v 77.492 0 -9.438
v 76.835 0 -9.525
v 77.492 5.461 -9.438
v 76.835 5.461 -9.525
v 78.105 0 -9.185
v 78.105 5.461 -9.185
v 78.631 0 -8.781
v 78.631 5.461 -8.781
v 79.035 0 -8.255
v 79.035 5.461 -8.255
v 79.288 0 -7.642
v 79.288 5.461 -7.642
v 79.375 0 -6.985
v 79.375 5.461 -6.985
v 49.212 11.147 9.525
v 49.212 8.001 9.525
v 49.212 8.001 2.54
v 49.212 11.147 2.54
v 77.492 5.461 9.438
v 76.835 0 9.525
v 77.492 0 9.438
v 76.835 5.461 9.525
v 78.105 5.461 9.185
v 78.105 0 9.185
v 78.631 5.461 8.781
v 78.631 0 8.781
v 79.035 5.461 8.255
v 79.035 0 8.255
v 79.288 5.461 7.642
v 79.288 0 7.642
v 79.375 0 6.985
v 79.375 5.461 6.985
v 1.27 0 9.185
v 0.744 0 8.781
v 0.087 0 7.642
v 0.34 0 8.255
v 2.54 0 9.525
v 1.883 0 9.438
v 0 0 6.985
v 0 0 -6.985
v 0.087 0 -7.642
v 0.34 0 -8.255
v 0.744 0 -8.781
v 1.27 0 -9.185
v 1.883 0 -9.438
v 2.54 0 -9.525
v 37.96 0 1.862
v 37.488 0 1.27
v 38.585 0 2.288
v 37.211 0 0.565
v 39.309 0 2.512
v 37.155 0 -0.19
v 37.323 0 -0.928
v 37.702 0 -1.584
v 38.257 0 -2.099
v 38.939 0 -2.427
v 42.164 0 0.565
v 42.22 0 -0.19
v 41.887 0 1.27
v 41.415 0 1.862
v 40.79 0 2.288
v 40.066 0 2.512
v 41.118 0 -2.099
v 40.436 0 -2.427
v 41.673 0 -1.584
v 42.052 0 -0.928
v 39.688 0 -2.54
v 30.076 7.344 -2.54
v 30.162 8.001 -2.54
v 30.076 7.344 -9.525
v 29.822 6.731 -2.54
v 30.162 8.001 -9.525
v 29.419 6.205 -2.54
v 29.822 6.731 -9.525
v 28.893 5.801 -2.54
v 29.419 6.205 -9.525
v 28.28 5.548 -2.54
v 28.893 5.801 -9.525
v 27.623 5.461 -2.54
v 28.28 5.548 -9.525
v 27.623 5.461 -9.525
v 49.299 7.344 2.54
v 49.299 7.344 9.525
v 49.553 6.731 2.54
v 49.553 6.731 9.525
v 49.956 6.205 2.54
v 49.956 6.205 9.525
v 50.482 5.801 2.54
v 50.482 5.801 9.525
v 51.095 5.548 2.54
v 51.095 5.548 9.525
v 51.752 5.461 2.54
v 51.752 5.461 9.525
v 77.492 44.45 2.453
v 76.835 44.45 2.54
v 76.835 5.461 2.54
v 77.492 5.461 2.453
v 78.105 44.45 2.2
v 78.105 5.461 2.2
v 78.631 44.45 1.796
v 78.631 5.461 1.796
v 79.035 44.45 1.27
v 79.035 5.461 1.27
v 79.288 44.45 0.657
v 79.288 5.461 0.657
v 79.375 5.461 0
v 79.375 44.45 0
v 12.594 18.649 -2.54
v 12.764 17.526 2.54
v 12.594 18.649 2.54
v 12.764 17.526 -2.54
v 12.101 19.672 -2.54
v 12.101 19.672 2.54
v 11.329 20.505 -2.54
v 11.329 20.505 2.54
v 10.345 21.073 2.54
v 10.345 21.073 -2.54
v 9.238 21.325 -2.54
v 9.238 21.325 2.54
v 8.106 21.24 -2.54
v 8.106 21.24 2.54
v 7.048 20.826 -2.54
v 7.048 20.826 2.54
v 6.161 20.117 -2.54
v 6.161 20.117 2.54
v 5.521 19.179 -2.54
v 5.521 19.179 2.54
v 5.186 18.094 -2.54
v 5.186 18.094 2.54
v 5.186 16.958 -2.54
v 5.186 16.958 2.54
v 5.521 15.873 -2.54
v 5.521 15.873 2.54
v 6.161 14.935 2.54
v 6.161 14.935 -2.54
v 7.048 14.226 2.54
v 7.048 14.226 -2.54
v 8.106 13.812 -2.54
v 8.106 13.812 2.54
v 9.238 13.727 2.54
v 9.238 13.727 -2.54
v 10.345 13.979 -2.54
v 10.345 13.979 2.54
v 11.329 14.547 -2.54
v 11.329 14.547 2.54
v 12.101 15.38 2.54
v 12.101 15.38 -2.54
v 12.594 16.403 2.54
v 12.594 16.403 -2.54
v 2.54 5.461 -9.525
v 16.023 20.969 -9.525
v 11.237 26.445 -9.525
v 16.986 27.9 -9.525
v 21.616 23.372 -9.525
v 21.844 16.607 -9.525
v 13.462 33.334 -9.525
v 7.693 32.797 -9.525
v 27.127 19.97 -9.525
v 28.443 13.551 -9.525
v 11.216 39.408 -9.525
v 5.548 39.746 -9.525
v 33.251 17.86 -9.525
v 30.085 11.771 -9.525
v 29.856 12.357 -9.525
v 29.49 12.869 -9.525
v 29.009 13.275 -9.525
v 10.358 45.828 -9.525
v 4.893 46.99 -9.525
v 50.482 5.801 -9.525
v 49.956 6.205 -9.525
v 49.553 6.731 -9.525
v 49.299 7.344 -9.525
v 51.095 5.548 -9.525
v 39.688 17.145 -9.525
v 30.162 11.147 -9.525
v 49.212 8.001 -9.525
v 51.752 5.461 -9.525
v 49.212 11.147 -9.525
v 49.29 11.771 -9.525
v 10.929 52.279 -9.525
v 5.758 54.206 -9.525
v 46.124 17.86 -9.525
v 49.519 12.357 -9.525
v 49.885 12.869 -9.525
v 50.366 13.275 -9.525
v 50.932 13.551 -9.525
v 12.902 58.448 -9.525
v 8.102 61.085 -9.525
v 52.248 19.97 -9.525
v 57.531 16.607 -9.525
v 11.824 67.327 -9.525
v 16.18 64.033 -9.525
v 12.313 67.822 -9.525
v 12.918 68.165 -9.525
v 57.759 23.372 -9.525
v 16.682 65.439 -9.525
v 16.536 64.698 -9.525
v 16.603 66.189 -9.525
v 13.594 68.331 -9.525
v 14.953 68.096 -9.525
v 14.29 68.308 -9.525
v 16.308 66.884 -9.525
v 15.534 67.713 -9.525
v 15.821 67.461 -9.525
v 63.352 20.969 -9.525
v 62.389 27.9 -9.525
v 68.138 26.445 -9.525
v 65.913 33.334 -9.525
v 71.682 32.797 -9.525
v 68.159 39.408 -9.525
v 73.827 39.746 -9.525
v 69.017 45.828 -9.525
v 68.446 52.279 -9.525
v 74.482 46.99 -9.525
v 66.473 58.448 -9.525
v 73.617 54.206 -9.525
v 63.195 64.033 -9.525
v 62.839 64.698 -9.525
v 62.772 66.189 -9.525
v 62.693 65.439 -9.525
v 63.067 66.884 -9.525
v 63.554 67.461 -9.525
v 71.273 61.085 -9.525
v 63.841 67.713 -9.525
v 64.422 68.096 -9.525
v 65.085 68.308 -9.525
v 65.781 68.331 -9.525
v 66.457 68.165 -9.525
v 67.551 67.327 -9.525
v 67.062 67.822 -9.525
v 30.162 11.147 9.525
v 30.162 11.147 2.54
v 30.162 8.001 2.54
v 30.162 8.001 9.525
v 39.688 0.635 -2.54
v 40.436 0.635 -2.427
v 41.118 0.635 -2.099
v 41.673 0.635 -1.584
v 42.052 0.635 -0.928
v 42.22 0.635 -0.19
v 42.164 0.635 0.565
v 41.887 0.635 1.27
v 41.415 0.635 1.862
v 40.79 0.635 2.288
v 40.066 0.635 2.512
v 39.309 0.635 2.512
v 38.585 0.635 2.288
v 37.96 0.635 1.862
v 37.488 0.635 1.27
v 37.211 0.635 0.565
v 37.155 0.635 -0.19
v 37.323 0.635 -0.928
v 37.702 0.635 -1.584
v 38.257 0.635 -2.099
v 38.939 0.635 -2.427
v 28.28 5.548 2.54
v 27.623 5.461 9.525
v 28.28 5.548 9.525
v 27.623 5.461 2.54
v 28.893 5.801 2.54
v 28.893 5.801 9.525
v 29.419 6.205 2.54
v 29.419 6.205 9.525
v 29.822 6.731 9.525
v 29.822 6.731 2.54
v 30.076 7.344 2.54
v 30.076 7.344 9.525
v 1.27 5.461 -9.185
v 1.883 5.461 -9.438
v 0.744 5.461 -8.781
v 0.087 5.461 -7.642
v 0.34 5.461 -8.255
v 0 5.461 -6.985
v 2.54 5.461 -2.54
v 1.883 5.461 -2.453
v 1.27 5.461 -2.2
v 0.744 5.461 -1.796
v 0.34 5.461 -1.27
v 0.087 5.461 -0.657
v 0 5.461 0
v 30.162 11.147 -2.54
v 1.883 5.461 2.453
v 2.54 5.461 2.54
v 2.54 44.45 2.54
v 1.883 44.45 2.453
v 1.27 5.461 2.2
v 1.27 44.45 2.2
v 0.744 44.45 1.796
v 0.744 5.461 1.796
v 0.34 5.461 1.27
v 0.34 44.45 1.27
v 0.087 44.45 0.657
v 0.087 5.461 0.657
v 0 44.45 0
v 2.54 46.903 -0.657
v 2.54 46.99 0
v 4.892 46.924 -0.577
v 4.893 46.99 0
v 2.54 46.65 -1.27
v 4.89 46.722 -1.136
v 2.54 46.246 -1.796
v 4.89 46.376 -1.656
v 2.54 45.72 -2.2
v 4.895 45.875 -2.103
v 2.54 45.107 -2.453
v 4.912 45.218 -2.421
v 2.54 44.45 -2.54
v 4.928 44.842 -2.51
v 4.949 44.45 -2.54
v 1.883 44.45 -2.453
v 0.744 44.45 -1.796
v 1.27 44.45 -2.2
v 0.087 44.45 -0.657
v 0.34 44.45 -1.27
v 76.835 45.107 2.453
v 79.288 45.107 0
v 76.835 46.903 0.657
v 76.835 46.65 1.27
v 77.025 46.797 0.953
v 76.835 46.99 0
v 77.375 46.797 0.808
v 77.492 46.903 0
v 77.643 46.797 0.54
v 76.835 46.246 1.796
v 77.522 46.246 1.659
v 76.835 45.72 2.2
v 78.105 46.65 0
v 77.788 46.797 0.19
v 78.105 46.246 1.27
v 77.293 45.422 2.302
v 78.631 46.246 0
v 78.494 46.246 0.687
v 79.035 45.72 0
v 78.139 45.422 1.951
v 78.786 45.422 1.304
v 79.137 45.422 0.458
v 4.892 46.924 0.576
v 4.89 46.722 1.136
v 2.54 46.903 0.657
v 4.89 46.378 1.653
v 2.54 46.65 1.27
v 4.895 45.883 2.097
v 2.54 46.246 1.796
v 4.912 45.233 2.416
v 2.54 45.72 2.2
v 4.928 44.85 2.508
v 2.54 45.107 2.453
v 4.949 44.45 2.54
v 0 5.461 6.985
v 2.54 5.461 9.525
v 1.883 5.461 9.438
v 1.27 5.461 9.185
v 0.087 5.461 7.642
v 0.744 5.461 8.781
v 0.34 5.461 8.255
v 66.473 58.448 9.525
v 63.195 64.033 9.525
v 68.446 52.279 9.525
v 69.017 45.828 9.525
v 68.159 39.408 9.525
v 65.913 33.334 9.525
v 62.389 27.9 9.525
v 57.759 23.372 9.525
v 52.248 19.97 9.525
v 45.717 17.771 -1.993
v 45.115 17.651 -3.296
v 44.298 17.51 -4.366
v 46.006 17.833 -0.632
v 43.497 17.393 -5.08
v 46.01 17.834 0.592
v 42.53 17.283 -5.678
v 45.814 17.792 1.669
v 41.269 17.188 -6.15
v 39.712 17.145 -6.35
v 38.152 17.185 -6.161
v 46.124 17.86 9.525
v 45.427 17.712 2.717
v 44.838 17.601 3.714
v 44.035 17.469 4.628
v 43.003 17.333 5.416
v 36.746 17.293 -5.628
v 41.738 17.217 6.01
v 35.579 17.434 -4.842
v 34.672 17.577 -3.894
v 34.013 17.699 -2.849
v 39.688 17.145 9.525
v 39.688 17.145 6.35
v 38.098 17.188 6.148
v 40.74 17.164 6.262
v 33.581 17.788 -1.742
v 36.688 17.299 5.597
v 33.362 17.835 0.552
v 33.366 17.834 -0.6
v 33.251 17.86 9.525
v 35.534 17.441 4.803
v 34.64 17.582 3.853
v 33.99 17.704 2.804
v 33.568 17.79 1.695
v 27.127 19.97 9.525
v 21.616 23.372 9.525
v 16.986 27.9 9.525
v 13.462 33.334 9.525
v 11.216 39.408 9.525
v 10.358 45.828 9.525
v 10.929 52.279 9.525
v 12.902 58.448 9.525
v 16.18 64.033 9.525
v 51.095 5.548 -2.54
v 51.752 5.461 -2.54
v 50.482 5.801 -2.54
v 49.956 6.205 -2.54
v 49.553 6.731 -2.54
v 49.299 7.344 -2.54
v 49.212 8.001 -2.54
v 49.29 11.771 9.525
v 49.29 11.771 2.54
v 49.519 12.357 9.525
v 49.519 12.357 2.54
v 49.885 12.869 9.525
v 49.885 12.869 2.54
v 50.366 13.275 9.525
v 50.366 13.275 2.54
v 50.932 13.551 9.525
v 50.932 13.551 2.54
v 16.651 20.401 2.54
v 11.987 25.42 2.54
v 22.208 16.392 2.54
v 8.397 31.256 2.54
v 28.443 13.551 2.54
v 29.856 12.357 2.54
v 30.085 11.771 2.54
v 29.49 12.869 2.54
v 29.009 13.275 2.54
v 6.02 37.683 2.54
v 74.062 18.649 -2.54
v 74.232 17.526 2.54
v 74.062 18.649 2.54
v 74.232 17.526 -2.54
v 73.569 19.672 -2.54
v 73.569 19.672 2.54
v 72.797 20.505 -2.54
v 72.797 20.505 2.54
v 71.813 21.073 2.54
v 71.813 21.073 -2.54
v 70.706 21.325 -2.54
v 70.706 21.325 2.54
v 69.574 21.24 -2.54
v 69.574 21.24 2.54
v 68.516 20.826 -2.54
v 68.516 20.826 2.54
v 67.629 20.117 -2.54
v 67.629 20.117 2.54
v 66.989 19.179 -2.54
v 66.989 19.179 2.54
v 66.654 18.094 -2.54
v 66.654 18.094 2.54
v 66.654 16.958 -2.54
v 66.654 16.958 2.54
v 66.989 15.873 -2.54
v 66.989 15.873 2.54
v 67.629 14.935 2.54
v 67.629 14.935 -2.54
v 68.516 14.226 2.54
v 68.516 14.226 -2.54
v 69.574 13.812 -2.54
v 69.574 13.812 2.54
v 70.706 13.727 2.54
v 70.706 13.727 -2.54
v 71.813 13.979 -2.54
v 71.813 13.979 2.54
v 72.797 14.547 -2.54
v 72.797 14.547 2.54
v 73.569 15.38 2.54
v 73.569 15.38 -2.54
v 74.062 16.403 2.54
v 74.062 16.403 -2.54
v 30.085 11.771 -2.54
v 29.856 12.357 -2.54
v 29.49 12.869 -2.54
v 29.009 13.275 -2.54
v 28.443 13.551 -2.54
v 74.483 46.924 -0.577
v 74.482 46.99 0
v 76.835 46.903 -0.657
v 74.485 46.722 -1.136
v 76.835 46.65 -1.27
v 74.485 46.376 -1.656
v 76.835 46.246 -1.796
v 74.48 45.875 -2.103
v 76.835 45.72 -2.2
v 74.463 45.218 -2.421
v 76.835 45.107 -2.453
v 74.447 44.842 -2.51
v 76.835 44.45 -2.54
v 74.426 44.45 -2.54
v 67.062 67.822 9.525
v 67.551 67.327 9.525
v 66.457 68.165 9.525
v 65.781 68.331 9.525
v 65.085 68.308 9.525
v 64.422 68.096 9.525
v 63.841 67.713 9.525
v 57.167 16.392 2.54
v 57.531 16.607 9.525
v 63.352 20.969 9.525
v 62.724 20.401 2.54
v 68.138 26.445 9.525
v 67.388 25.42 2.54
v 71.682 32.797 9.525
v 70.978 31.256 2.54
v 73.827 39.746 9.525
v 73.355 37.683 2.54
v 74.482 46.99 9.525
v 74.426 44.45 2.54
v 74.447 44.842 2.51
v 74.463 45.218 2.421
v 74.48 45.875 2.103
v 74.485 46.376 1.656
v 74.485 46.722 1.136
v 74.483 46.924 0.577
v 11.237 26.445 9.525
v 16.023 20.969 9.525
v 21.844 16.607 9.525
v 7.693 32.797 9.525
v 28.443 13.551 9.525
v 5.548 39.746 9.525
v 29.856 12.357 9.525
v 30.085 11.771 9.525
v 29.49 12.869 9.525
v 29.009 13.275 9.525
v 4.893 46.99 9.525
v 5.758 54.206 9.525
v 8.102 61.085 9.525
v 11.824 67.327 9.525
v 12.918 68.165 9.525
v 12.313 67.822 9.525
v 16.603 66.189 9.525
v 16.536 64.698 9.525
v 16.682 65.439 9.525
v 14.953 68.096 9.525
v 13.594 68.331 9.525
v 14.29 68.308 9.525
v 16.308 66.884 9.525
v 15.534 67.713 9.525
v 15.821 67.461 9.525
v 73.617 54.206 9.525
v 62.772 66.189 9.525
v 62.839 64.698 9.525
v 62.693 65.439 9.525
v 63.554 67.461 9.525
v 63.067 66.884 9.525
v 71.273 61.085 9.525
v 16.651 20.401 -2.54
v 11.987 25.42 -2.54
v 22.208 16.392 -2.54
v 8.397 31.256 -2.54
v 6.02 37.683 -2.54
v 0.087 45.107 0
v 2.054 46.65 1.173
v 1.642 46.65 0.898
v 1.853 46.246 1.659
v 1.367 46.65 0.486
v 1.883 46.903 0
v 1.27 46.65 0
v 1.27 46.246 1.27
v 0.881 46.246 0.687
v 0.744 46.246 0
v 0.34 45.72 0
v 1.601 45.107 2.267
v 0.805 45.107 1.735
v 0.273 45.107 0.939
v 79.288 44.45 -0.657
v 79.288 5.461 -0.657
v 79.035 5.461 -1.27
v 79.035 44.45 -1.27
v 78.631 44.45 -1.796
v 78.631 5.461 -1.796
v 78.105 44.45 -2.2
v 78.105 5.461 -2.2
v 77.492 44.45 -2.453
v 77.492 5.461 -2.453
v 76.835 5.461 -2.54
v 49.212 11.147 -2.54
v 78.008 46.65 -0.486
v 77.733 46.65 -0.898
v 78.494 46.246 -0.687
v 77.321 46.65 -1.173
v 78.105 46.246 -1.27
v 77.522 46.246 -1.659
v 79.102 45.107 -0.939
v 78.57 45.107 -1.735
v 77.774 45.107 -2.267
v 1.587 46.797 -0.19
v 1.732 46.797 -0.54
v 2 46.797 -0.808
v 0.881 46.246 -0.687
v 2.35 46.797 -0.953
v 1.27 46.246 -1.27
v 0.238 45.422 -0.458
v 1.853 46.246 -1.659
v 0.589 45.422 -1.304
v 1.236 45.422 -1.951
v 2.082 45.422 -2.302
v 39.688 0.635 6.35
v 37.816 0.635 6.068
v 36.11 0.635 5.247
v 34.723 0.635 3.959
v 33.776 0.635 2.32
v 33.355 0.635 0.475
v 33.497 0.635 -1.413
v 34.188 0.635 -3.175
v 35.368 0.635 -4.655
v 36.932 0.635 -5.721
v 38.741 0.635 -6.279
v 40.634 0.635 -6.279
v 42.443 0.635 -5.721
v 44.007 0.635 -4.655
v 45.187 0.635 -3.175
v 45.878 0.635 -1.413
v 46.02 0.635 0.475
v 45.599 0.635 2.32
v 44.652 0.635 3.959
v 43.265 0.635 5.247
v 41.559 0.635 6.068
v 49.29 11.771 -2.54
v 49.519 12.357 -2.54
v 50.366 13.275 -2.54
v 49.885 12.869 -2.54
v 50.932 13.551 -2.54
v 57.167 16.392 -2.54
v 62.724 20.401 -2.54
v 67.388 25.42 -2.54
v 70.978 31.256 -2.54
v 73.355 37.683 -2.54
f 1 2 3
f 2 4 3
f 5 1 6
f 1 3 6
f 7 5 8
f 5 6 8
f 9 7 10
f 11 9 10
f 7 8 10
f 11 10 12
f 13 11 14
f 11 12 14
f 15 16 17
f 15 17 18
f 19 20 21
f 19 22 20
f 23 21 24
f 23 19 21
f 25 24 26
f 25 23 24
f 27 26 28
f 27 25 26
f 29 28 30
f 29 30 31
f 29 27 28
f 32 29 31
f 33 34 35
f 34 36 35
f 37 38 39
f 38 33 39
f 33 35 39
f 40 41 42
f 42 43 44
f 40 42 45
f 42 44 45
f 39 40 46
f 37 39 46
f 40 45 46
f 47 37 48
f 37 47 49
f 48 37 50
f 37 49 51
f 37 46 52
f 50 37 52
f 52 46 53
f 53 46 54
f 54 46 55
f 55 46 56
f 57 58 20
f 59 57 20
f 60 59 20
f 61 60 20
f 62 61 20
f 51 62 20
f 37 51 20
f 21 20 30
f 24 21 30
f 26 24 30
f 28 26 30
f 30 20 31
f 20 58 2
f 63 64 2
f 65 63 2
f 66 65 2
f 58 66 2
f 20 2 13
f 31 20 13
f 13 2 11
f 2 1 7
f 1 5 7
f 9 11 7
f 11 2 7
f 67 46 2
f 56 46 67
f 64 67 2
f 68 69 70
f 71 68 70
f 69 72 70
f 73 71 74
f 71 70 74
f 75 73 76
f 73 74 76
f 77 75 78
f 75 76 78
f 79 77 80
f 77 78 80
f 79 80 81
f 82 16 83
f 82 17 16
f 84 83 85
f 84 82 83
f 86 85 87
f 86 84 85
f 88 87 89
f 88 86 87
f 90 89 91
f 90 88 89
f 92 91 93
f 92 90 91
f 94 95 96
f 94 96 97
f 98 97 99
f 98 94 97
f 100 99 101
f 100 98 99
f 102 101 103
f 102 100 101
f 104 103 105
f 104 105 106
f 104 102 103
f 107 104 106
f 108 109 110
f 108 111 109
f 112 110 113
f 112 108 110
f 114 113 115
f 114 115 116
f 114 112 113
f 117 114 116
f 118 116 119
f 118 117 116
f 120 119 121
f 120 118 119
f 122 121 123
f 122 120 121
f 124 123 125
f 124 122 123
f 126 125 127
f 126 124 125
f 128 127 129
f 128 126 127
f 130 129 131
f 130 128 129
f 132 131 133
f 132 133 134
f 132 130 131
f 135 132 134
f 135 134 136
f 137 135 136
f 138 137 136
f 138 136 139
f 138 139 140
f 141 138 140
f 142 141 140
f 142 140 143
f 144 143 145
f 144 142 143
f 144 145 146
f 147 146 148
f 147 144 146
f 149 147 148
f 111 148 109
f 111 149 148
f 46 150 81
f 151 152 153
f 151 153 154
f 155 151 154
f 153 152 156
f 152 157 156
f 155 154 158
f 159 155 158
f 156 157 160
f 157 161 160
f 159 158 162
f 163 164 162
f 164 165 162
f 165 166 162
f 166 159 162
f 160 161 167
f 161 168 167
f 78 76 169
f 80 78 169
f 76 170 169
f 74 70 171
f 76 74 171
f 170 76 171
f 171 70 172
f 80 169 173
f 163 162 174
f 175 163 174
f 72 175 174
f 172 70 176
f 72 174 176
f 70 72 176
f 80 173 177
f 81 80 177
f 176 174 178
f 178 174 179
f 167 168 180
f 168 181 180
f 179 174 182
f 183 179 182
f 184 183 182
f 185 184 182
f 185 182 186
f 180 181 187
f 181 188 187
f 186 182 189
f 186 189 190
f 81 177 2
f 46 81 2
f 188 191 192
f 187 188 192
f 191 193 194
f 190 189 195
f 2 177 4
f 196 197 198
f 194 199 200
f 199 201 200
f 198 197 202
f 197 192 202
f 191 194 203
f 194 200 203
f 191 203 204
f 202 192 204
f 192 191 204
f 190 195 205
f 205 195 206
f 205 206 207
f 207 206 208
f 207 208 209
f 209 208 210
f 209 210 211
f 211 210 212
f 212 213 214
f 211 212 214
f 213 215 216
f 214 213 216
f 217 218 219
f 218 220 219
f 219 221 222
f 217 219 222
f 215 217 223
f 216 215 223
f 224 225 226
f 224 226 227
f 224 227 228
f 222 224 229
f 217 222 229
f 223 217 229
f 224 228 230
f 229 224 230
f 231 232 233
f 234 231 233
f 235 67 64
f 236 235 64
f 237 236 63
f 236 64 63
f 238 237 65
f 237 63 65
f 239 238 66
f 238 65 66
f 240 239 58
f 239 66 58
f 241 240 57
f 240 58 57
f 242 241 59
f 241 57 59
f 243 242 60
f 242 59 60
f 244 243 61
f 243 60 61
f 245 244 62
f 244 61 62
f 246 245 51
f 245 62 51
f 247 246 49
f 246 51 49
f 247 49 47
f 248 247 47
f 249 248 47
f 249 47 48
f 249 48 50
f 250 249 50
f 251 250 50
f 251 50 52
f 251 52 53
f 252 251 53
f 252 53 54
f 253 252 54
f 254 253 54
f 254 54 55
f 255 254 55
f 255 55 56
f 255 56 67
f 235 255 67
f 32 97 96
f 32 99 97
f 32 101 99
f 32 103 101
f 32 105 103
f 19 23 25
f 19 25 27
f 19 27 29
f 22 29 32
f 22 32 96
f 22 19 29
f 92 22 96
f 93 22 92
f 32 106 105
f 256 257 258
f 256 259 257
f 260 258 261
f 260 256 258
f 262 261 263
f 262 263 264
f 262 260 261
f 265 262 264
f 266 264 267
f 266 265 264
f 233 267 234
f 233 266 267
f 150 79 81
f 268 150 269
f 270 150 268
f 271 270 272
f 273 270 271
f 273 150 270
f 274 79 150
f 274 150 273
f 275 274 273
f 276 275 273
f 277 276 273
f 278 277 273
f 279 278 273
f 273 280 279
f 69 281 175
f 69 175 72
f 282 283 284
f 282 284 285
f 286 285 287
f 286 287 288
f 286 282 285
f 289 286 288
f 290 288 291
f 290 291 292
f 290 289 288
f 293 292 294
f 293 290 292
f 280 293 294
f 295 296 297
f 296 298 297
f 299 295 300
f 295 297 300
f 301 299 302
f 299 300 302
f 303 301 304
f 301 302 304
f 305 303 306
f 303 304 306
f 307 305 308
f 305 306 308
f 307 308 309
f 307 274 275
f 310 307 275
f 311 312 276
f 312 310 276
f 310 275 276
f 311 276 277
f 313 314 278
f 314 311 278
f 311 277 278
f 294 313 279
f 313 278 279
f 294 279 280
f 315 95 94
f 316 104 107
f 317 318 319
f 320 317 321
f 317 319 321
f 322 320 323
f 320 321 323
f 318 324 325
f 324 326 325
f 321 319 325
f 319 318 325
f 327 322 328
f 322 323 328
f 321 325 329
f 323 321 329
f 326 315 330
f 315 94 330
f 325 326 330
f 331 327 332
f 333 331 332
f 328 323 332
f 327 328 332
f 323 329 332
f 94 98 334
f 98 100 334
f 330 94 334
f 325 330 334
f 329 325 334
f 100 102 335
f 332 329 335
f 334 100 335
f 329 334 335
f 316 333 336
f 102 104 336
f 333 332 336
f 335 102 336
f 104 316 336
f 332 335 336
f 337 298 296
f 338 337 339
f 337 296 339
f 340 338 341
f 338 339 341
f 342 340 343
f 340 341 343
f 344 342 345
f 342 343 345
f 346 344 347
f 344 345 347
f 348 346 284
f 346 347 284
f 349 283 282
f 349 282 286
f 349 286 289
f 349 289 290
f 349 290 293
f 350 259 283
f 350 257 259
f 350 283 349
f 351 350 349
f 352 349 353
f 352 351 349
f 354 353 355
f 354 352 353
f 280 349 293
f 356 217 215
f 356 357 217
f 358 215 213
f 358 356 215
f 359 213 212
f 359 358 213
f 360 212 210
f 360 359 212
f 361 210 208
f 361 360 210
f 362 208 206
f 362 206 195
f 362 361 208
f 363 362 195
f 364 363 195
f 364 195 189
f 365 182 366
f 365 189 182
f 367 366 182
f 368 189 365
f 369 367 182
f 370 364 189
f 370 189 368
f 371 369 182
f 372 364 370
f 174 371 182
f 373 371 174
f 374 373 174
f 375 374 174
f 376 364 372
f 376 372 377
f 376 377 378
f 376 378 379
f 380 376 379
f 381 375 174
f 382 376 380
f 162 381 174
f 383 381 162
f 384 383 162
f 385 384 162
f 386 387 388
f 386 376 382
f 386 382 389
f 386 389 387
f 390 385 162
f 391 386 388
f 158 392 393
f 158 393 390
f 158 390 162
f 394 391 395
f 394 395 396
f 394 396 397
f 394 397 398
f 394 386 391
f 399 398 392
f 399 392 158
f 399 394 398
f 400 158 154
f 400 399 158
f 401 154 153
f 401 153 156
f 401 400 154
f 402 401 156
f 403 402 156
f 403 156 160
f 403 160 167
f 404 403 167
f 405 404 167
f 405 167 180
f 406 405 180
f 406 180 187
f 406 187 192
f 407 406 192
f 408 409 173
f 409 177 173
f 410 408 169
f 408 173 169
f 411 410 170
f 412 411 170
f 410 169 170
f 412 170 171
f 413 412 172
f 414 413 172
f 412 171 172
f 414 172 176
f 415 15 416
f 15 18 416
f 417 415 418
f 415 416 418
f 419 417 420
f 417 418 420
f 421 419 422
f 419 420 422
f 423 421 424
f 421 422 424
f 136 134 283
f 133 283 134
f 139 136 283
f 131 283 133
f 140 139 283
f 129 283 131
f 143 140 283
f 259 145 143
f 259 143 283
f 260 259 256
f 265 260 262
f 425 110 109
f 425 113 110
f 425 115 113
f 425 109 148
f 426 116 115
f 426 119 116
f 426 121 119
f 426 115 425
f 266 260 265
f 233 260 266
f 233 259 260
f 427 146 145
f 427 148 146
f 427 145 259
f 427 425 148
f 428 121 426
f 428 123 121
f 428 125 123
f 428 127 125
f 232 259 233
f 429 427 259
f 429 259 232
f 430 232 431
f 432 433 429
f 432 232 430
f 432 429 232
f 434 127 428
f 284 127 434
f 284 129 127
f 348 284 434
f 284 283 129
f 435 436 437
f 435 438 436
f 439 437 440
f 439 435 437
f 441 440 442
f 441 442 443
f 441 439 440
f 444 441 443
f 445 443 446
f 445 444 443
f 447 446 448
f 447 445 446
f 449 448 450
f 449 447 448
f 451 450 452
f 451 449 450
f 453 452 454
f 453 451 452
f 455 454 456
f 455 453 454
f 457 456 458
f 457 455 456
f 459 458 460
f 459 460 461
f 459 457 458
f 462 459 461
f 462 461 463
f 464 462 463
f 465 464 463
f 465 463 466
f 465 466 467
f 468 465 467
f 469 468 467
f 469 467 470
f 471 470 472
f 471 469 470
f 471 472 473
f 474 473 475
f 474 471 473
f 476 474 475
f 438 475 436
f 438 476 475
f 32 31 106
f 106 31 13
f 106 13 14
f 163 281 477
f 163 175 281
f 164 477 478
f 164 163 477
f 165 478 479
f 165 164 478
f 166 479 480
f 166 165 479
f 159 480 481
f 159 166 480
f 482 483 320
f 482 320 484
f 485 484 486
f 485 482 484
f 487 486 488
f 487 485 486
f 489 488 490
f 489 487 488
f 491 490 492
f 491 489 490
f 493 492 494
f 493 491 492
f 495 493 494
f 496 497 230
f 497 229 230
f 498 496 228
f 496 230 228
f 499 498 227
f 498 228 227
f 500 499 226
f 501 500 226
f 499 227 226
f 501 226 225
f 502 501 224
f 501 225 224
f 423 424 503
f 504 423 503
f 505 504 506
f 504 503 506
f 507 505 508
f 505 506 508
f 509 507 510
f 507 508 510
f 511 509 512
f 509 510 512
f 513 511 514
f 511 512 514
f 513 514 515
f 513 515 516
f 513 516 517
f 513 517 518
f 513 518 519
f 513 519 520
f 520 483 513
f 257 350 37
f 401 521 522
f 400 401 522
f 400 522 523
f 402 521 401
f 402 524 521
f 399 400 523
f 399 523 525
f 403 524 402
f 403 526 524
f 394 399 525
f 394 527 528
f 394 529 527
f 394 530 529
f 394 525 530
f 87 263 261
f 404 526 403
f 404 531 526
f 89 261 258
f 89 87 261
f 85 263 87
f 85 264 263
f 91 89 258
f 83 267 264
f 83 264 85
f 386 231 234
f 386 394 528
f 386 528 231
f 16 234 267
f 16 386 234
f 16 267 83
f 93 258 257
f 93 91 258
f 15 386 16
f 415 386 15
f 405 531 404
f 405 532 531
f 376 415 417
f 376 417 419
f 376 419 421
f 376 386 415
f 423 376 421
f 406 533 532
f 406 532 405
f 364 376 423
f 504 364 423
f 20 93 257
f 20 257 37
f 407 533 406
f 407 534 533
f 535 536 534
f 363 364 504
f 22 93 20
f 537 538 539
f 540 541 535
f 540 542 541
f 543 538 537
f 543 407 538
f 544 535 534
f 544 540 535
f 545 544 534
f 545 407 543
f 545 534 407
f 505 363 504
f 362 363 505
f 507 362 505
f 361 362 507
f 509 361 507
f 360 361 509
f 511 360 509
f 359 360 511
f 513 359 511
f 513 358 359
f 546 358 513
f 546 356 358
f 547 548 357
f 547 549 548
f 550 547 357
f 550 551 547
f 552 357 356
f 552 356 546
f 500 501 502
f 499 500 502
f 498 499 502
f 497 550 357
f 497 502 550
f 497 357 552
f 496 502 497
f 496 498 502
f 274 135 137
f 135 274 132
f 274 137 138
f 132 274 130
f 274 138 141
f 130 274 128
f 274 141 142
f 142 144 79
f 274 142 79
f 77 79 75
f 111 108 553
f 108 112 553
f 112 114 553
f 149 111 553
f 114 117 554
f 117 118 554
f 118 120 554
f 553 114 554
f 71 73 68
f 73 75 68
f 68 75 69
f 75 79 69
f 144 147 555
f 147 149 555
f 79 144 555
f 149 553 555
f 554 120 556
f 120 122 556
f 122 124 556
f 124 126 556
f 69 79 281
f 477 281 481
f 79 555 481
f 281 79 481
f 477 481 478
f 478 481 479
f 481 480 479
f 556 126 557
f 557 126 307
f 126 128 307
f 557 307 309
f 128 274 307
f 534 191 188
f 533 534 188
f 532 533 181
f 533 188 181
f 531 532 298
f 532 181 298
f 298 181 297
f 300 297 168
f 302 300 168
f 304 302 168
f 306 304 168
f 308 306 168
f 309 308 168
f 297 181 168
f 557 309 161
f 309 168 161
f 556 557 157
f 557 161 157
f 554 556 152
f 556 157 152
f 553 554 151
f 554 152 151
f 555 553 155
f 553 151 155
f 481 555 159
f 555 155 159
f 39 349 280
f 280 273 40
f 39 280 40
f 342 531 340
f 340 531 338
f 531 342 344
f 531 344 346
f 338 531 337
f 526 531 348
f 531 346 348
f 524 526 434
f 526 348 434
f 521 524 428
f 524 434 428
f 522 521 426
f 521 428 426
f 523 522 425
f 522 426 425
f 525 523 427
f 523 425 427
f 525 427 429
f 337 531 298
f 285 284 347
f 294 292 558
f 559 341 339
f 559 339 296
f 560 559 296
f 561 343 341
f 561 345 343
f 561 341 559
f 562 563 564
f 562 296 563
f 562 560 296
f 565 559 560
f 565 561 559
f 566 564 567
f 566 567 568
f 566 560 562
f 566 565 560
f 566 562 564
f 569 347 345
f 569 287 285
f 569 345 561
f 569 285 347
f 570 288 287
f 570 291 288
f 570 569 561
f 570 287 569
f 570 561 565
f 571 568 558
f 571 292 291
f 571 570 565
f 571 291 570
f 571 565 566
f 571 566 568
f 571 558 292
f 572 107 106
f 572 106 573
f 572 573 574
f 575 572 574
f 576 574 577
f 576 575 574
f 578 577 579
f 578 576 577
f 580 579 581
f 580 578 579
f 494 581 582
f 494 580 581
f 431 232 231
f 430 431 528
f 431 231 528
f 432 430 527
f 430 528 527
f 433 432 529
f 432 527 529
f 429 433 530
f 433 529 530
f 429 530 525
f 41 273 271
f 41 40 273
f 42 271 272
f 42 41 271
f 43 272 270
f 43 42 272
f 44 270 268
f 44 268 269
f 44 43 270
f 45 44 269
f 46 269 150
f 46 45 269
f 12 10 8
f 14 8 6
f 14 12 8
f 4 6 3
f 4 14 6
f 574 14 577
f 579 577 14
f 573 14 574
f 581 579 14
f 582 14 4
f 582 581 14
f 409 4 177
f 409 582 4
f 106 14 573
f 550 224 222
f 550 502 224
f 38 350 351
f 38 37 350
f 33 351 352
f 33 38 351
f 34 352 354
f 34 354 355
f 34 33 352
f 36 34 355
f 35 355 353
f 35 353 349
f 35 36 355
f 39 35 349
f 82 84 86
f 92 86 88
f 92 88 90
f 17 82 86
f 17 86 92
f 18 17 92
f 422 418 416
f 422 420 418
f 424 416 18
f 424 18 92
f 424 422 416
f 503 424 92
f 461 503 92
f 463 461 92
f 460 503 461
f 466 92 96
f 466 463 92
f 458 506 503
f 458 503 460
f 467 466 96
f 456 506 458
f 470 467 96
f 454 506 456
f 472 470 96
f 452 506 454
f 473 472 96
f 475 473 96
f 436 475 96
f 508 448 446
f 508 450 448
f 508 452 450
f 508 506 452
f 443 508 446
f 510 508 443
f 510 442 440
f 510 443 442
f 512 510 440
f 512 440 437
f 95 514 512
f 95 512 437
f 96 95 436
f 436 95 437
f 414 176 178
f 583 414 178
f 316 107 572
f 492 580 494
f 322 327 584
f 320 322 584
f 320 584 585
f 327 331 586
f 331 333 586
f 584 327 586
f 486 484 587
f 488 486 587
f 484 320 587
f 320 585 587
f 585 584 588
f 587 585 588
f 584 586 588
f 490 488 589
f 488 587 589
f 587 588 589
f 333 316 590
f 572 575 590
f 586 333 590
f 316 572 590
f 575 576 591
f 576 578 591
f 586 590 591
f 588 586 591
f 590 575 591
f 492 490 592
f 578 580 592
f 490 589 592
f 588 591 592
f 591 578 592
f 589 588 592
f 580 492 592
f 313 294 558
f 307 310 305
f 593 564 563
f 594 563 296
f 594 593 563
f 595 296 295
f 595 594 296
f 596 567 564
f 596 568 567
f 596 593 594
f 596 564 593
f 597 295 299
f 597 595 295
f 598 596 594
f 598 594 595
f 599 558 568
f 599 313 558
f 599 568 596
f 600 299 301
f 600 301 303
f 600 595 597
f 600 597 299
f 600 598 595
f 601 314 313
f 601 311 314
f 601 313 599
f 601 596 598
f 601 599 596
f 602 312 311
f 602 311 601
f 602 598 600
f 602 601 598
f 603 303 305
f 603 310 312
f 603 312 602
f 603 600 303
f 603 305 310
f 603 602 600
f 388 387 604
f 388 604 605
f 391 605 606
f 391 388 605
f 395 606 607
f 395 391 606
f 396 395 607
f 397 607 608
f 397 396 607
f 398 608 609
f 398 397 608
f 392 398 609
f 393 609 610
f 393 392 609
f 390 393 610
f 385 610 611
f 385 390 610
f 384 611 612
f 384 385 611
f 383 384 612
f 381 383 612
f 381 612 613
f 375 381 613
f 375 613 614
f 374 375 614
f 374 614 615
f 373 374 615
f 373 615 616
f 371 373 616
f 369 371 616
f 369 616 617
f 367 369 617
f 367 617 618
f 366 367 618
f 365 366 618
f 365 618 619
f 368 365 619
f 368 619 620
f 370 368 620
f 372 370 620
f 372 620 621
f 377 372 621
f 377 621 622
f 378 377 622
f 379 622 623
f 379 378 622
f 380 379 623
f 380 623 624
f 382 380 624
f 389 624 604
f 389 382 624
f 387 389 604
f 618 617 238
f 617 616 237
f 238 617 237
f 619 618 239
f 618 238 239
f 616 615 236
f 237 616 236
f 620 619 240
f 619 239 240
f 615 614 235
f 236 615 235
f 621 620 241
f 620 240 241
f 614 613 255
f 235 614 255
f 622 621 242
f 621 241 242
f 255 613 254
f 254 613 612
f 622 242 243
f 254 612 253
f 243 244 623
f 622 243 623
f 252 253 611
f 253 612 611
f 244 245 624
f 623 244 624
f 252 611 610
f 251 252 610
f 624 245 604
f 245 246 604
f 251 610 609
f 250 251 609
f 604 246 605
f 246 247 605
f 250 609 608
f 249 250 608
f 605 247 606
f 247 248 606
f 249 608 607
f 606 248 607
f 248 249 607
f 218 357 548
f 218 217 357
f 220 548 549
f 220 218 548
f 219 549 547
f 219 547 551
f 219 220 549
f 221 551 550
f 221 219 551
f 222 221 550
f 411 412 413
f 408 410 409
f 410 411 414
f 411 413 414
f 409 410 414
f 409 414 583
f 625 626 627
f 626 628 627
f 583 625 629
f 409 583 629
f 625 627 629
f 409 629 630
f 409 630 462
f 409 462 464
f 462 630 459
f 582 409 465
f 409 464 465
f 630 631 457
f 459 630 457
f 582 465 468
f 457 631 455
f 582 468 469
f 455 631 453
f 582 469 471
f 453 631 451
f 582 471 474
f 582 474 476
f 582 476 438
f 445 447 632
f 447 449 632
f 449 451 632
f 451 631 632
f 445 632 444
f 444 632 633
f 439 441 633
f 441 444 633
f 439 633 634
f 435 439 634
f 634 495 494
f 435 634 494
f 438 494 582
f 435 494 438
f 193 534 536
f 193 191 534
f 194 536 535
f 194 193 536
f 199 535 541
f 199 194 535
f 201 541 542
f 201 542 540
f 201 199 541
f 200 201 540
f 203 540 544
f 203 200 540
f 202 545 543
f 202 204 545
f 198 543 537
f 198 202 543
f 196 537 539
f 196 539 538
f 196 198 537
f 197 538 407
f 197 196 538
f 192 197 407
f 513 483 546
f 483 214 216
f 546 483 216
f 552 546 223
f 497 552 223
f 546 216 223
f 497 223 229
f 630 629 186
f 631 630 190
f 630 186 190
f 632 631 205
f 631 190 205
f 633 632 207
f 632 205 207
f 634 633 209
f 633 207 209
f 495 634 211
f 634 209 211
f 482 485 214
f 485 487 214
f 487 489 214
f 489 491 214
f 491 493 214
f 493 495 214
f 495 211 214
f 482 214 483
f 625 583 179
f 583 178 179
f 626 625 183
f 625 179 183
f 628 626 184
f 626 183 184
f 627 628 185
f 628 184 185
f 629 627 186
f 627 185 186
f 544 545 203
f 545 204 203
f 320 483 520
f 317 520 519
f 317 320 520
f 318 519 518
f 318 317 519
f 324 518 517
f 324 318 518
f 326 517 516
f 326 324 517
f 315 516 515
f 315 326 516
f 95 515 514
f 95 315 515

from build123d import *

# Parameters (mm, degrees)
BOSS_EXTRUDE1_DEPTH = 9.525
SKETCH1_3_R         = 3.81
BOSS_EXTRUDE2_DEPTH = 2.54
FILLET1_R           = 2.54
SKETCH2_R           = 2.54
CUT_EXTRUDE1_DEPTH  = 106.176870727
SKETCH7_R           = 6.35
CUT_EXTRUDE2_DEPTH  = 18.415
FILLET2_R           = 2.54
FILLET3_R           = 2.54


with BuildPart() as part:
    # Sketch1 → Boss-Extrude1 (new, symmetric)
    with BuildSketch(Plane.XY):
        with BuildLine():
            ThreePointArc((61.722, 65.850540956), (66.416458594, 34.38975697), (39.6875, 17.145))
            Line((39.6875, 17.145), (39.6875, 0))
            Line((39.6875, 0), (79.375, 0))
            Line((79.375, 0), (79.375, 5.461))
            Line((79.375, 5.461), (49.2125, 5.461))
            Line((49.2125, 5.461), (49.2125, 13.012981804))
            ThreePointArc((49.2125, 13.012981804), (67.609880758, 25.71564604), (74.481791773, 46.99))
            ThreePointArc((74.481791773, 46.99), (72.157634164, 58.995640214), (65.823660173, 69.455940354))
            Line((65.823660173, 69.455940354), (61.722, 65.850540956))
        make_face()
        with BuildLine():
            Line((39.6875, 0), (39.6875, 17.145))
            ThreePointArc((39.6875, 17.145), (12.958541406, 34.38975697), (17.653, 65.850540956))
            Line((17.653, 65.850540956), (13.551339827, 69.455940354))
            ThreePointArc((13.551339827, 69.455940354), (7.217365836, 58.995640214), (4.893208227, 46.99))
            ThreePointArc((4.893208227, 46.99), (11.765119242, 25.71564604), (30.1625, 13.012981804))
            Line((30.1625, 13.012981804), (30.1625, 5.461))
            Line((30.1625, 5.461), (0, 5.461))
            Line((0, 5.461), (0, 0))
            Line((0, 0), (39.6875, 0))
        make_face()
    extrude(amount=BOSS_EXTRUDE1_DEPTH, both=True)

    # Sketch1<3> → Boss-Extrude2 (add, symmetric)
    # profile 1 of 2: a face of its own
    with BuildSketch(Plane.XY):
        with BuildLine():
            Line((0, 46.99), (0, 5.461))
            Line((0, 5.461), (30.1625, 5.461))
            Line((30.1625, 5.461), (30.1625, 13.012981804))
            ThreePointArc((30.1625, 13.012981804), (11.765119242, 25.71564604), (4.893208227, 46.99))
            Line((4.893208227, 46.99), (0, 46.99))
        make_face()
        with Locations((8.9535, 17.526)):
            Circle(SKETCH1_3_R, mode=Mode.SUBTRACT)
    # profile 2 of 2: a face of its own
    with BuildSketch(Plane.XY):
        with BuildLine():
            Line((49.2125, 5.461), (79.375, 5.461))
            Line((79.375, 5.461), (79.375, 46.99))
            Line((79.375, 46.99), (74.481791773, 46.99))
            ThreePointArc((74.481791773, 46.99), (67.609880758, 25.71564604), (49.2125, 13.012981804))
            Line((49.2125, 13.012981804), (49.2125, 5.461))
        make_face()
        with Locations((70.4215, 17.526)):
            Circle(SKETCH1_3_R, mode=Mode.SUBTRACT)
    extrude(amount=BOSS_EXTRUDE2_DEPTH, both=True)

    # Fillet1
    fillet1_edges = [part.edges().sort_by_distance(p)[0] for p in [
        (17.653, 65.850540956, 0),
    ]]
    fillet(fillet1_edges, radius=FILLET1_R)
    fillet1_2_edges = [part.edges().sort_by_distance(p)[0] for p in [
        (61.722, 65.850540956, 0),
    ]]
    fillet(fillet1_2_edges, radius=FILLET1_R)
    fillet1_3_edges = [part.edges().sort_by_distance(p)[0] for p in [
        (0, 2.7305, -9.525),
    ]]
    fillet(fillet1_3_edges, radius=FILLET1_R)
    fillet1_4_edges = [part.edges().sort_by_distance(p)[0] for p in [
        (79.375, 2.7305, -9.525),
    ]]
    fillet(fillet1_4_edges, radius=FILLET1_R)
    fillet1_5_edges = [part.edges().sort_by_distance(p)[0] for p in [
        (13.551339827, 69.455940354, 0),
    ]]
    fillet(fillet1_5_edges, radius=FILLET1_R)
    fillet1_6_edges = [part.edges().sort_by_distance(p)[0] for p in [
        (0, 2.7305, 9.525),
    ]]
    fillet(fillet1_6_edges, radius=FILLET1_R)
    fillet1_7_edges = [part.edges().sort_by_distance(p)[0] for p in [
        (79.375, 2.7305, 9.525),
    ]]
    fillet(fillet1_7_edges, radius=FILLET1_R)
    fillet1_8_edges = [part.edges().sort_by_distance(p)[0] for p in [
        (65.823660173, 69.455940354, 0),
    ]]
    fillet(fillet1_8_edges, radius=FILLET1_R)
    fillet1_9_edges = [part.edges().sort_by_distance(p)[0] for p in [
        (79.375, 26.2255, -2.54),
    ]]
    fillet(fillet1_9_edges, radius=FILLET1_R)
    fillet1_10_edges = [part.edges().sort_by_distance(p)[0] for p in [
        (79.375, 26.2255, 2.54),
    ]]
    fillet(fillet1_10_edges, radius=FILLET1_R - 0.0001)  # a hair under: the kernel refuses the full size
    fillet1_11_edges = [part.edges().sort_by_distance(p)[0] for p in [
        (49.2125, 13.012981804, 6.0325),
    ]]
    fillet(fillet1_11_edges, radius=FILLET1_R)
    fillet1_12_edges = [part.edges().sort_by_distance(p)[0] for p in [
        (49.2125, 5.461, 6.0325),
    ]]
    fillet(fillet1_12_edges, radius=FILLET1_R)
    fillet1_13_edges = [part.edges().sort_by_distance(p)[0] for p in [
        (75.658395887, 46.99, -2.54),
    ]]
    fillet(fillet1_13_edges, radius=FILLET1_R - 0.0001)  # a hair under: the kernel refuses the full size

    # Sketch2 → Cut-Extrude1 (cut, through all)
    with BuildSketch(Plane.XZ):
        with Locations(Location((39.6875, 0, 0), (0, 0, 270))):
            Circle(SKETCH2_R)
    extrude(amount=-CUT_EXTRUDE1_DEPTH, mode=Mode.SUBTRACT)

    # Sketch7 → Cut-Extrude2 (cut)
    with BuildSketch(Plane(origin=(0, 19.05, 0), x_dir=(-1, 0, 0), z_dir=(0, -1, 0))):
        with Locations(Location((-39.6875, 0, 0), (0, 0, 270))):
            Circle(SKETCH7_R)
    extrude(amount=CUT_EXTRUDE2_DEPTH, mode=Mode.SUBTRACT)

    # Fillet2
    fillet2_edges = [part.edges().sort_by_distance(p)[0] for p in [
        (30.1625, 5.461, 6.0325),
    ]]
    fillet(fillet2_edges, radius=FILLET2_R)
    fillet2_2_edges = [part.edges().sort_by_distance(p)[0] for p in [
        (30.1625, 13.012981804, 6.0325),
    ]]
    fillet(fillet2_2_edges, radius=FILLET2_R)
    fillet2_3_edges = [part.edges().sort_by_distance(p)[0] for p in [
        (0, 26.2255, 2.54),
    ]]
    fillet(fillet2_3_edges, radius=FILLET2_R)
    fillet2_4_edges = [part.edges().sort_by_distance(p)[0] for p in [
        (0, 26.2255, -2.54),
    ]]
    fillet(fillet2_4_edges, radius=FILLET2_R - 0.0001)  # a hair under: the kernel refuses the full size
    fillet2_5_edges = [part.edges().sort_by_distance(p)[0] for p in [
        (3.716604113, 46.99, 2.54),
    ]]
    fillet(fillet2_5_edges, radius=FILLET2_R - 0.0001)  # a hair under: the kernel refuses the full size

    # Fillet3
    fillet3_edges = [part.edges().sort_by_distance(p)[0] for p in [
        (30.1625, 5.461, -6.0325),
        (30.1625, 13.012981804, -6.0325),
        (49.2125, 13.012981804, -6.0325),
        (49.2125, 5.461, -6.0325),
    ]]
    fillet(fillet3_edges, radius=FILLET3_R)


solid = part.part
